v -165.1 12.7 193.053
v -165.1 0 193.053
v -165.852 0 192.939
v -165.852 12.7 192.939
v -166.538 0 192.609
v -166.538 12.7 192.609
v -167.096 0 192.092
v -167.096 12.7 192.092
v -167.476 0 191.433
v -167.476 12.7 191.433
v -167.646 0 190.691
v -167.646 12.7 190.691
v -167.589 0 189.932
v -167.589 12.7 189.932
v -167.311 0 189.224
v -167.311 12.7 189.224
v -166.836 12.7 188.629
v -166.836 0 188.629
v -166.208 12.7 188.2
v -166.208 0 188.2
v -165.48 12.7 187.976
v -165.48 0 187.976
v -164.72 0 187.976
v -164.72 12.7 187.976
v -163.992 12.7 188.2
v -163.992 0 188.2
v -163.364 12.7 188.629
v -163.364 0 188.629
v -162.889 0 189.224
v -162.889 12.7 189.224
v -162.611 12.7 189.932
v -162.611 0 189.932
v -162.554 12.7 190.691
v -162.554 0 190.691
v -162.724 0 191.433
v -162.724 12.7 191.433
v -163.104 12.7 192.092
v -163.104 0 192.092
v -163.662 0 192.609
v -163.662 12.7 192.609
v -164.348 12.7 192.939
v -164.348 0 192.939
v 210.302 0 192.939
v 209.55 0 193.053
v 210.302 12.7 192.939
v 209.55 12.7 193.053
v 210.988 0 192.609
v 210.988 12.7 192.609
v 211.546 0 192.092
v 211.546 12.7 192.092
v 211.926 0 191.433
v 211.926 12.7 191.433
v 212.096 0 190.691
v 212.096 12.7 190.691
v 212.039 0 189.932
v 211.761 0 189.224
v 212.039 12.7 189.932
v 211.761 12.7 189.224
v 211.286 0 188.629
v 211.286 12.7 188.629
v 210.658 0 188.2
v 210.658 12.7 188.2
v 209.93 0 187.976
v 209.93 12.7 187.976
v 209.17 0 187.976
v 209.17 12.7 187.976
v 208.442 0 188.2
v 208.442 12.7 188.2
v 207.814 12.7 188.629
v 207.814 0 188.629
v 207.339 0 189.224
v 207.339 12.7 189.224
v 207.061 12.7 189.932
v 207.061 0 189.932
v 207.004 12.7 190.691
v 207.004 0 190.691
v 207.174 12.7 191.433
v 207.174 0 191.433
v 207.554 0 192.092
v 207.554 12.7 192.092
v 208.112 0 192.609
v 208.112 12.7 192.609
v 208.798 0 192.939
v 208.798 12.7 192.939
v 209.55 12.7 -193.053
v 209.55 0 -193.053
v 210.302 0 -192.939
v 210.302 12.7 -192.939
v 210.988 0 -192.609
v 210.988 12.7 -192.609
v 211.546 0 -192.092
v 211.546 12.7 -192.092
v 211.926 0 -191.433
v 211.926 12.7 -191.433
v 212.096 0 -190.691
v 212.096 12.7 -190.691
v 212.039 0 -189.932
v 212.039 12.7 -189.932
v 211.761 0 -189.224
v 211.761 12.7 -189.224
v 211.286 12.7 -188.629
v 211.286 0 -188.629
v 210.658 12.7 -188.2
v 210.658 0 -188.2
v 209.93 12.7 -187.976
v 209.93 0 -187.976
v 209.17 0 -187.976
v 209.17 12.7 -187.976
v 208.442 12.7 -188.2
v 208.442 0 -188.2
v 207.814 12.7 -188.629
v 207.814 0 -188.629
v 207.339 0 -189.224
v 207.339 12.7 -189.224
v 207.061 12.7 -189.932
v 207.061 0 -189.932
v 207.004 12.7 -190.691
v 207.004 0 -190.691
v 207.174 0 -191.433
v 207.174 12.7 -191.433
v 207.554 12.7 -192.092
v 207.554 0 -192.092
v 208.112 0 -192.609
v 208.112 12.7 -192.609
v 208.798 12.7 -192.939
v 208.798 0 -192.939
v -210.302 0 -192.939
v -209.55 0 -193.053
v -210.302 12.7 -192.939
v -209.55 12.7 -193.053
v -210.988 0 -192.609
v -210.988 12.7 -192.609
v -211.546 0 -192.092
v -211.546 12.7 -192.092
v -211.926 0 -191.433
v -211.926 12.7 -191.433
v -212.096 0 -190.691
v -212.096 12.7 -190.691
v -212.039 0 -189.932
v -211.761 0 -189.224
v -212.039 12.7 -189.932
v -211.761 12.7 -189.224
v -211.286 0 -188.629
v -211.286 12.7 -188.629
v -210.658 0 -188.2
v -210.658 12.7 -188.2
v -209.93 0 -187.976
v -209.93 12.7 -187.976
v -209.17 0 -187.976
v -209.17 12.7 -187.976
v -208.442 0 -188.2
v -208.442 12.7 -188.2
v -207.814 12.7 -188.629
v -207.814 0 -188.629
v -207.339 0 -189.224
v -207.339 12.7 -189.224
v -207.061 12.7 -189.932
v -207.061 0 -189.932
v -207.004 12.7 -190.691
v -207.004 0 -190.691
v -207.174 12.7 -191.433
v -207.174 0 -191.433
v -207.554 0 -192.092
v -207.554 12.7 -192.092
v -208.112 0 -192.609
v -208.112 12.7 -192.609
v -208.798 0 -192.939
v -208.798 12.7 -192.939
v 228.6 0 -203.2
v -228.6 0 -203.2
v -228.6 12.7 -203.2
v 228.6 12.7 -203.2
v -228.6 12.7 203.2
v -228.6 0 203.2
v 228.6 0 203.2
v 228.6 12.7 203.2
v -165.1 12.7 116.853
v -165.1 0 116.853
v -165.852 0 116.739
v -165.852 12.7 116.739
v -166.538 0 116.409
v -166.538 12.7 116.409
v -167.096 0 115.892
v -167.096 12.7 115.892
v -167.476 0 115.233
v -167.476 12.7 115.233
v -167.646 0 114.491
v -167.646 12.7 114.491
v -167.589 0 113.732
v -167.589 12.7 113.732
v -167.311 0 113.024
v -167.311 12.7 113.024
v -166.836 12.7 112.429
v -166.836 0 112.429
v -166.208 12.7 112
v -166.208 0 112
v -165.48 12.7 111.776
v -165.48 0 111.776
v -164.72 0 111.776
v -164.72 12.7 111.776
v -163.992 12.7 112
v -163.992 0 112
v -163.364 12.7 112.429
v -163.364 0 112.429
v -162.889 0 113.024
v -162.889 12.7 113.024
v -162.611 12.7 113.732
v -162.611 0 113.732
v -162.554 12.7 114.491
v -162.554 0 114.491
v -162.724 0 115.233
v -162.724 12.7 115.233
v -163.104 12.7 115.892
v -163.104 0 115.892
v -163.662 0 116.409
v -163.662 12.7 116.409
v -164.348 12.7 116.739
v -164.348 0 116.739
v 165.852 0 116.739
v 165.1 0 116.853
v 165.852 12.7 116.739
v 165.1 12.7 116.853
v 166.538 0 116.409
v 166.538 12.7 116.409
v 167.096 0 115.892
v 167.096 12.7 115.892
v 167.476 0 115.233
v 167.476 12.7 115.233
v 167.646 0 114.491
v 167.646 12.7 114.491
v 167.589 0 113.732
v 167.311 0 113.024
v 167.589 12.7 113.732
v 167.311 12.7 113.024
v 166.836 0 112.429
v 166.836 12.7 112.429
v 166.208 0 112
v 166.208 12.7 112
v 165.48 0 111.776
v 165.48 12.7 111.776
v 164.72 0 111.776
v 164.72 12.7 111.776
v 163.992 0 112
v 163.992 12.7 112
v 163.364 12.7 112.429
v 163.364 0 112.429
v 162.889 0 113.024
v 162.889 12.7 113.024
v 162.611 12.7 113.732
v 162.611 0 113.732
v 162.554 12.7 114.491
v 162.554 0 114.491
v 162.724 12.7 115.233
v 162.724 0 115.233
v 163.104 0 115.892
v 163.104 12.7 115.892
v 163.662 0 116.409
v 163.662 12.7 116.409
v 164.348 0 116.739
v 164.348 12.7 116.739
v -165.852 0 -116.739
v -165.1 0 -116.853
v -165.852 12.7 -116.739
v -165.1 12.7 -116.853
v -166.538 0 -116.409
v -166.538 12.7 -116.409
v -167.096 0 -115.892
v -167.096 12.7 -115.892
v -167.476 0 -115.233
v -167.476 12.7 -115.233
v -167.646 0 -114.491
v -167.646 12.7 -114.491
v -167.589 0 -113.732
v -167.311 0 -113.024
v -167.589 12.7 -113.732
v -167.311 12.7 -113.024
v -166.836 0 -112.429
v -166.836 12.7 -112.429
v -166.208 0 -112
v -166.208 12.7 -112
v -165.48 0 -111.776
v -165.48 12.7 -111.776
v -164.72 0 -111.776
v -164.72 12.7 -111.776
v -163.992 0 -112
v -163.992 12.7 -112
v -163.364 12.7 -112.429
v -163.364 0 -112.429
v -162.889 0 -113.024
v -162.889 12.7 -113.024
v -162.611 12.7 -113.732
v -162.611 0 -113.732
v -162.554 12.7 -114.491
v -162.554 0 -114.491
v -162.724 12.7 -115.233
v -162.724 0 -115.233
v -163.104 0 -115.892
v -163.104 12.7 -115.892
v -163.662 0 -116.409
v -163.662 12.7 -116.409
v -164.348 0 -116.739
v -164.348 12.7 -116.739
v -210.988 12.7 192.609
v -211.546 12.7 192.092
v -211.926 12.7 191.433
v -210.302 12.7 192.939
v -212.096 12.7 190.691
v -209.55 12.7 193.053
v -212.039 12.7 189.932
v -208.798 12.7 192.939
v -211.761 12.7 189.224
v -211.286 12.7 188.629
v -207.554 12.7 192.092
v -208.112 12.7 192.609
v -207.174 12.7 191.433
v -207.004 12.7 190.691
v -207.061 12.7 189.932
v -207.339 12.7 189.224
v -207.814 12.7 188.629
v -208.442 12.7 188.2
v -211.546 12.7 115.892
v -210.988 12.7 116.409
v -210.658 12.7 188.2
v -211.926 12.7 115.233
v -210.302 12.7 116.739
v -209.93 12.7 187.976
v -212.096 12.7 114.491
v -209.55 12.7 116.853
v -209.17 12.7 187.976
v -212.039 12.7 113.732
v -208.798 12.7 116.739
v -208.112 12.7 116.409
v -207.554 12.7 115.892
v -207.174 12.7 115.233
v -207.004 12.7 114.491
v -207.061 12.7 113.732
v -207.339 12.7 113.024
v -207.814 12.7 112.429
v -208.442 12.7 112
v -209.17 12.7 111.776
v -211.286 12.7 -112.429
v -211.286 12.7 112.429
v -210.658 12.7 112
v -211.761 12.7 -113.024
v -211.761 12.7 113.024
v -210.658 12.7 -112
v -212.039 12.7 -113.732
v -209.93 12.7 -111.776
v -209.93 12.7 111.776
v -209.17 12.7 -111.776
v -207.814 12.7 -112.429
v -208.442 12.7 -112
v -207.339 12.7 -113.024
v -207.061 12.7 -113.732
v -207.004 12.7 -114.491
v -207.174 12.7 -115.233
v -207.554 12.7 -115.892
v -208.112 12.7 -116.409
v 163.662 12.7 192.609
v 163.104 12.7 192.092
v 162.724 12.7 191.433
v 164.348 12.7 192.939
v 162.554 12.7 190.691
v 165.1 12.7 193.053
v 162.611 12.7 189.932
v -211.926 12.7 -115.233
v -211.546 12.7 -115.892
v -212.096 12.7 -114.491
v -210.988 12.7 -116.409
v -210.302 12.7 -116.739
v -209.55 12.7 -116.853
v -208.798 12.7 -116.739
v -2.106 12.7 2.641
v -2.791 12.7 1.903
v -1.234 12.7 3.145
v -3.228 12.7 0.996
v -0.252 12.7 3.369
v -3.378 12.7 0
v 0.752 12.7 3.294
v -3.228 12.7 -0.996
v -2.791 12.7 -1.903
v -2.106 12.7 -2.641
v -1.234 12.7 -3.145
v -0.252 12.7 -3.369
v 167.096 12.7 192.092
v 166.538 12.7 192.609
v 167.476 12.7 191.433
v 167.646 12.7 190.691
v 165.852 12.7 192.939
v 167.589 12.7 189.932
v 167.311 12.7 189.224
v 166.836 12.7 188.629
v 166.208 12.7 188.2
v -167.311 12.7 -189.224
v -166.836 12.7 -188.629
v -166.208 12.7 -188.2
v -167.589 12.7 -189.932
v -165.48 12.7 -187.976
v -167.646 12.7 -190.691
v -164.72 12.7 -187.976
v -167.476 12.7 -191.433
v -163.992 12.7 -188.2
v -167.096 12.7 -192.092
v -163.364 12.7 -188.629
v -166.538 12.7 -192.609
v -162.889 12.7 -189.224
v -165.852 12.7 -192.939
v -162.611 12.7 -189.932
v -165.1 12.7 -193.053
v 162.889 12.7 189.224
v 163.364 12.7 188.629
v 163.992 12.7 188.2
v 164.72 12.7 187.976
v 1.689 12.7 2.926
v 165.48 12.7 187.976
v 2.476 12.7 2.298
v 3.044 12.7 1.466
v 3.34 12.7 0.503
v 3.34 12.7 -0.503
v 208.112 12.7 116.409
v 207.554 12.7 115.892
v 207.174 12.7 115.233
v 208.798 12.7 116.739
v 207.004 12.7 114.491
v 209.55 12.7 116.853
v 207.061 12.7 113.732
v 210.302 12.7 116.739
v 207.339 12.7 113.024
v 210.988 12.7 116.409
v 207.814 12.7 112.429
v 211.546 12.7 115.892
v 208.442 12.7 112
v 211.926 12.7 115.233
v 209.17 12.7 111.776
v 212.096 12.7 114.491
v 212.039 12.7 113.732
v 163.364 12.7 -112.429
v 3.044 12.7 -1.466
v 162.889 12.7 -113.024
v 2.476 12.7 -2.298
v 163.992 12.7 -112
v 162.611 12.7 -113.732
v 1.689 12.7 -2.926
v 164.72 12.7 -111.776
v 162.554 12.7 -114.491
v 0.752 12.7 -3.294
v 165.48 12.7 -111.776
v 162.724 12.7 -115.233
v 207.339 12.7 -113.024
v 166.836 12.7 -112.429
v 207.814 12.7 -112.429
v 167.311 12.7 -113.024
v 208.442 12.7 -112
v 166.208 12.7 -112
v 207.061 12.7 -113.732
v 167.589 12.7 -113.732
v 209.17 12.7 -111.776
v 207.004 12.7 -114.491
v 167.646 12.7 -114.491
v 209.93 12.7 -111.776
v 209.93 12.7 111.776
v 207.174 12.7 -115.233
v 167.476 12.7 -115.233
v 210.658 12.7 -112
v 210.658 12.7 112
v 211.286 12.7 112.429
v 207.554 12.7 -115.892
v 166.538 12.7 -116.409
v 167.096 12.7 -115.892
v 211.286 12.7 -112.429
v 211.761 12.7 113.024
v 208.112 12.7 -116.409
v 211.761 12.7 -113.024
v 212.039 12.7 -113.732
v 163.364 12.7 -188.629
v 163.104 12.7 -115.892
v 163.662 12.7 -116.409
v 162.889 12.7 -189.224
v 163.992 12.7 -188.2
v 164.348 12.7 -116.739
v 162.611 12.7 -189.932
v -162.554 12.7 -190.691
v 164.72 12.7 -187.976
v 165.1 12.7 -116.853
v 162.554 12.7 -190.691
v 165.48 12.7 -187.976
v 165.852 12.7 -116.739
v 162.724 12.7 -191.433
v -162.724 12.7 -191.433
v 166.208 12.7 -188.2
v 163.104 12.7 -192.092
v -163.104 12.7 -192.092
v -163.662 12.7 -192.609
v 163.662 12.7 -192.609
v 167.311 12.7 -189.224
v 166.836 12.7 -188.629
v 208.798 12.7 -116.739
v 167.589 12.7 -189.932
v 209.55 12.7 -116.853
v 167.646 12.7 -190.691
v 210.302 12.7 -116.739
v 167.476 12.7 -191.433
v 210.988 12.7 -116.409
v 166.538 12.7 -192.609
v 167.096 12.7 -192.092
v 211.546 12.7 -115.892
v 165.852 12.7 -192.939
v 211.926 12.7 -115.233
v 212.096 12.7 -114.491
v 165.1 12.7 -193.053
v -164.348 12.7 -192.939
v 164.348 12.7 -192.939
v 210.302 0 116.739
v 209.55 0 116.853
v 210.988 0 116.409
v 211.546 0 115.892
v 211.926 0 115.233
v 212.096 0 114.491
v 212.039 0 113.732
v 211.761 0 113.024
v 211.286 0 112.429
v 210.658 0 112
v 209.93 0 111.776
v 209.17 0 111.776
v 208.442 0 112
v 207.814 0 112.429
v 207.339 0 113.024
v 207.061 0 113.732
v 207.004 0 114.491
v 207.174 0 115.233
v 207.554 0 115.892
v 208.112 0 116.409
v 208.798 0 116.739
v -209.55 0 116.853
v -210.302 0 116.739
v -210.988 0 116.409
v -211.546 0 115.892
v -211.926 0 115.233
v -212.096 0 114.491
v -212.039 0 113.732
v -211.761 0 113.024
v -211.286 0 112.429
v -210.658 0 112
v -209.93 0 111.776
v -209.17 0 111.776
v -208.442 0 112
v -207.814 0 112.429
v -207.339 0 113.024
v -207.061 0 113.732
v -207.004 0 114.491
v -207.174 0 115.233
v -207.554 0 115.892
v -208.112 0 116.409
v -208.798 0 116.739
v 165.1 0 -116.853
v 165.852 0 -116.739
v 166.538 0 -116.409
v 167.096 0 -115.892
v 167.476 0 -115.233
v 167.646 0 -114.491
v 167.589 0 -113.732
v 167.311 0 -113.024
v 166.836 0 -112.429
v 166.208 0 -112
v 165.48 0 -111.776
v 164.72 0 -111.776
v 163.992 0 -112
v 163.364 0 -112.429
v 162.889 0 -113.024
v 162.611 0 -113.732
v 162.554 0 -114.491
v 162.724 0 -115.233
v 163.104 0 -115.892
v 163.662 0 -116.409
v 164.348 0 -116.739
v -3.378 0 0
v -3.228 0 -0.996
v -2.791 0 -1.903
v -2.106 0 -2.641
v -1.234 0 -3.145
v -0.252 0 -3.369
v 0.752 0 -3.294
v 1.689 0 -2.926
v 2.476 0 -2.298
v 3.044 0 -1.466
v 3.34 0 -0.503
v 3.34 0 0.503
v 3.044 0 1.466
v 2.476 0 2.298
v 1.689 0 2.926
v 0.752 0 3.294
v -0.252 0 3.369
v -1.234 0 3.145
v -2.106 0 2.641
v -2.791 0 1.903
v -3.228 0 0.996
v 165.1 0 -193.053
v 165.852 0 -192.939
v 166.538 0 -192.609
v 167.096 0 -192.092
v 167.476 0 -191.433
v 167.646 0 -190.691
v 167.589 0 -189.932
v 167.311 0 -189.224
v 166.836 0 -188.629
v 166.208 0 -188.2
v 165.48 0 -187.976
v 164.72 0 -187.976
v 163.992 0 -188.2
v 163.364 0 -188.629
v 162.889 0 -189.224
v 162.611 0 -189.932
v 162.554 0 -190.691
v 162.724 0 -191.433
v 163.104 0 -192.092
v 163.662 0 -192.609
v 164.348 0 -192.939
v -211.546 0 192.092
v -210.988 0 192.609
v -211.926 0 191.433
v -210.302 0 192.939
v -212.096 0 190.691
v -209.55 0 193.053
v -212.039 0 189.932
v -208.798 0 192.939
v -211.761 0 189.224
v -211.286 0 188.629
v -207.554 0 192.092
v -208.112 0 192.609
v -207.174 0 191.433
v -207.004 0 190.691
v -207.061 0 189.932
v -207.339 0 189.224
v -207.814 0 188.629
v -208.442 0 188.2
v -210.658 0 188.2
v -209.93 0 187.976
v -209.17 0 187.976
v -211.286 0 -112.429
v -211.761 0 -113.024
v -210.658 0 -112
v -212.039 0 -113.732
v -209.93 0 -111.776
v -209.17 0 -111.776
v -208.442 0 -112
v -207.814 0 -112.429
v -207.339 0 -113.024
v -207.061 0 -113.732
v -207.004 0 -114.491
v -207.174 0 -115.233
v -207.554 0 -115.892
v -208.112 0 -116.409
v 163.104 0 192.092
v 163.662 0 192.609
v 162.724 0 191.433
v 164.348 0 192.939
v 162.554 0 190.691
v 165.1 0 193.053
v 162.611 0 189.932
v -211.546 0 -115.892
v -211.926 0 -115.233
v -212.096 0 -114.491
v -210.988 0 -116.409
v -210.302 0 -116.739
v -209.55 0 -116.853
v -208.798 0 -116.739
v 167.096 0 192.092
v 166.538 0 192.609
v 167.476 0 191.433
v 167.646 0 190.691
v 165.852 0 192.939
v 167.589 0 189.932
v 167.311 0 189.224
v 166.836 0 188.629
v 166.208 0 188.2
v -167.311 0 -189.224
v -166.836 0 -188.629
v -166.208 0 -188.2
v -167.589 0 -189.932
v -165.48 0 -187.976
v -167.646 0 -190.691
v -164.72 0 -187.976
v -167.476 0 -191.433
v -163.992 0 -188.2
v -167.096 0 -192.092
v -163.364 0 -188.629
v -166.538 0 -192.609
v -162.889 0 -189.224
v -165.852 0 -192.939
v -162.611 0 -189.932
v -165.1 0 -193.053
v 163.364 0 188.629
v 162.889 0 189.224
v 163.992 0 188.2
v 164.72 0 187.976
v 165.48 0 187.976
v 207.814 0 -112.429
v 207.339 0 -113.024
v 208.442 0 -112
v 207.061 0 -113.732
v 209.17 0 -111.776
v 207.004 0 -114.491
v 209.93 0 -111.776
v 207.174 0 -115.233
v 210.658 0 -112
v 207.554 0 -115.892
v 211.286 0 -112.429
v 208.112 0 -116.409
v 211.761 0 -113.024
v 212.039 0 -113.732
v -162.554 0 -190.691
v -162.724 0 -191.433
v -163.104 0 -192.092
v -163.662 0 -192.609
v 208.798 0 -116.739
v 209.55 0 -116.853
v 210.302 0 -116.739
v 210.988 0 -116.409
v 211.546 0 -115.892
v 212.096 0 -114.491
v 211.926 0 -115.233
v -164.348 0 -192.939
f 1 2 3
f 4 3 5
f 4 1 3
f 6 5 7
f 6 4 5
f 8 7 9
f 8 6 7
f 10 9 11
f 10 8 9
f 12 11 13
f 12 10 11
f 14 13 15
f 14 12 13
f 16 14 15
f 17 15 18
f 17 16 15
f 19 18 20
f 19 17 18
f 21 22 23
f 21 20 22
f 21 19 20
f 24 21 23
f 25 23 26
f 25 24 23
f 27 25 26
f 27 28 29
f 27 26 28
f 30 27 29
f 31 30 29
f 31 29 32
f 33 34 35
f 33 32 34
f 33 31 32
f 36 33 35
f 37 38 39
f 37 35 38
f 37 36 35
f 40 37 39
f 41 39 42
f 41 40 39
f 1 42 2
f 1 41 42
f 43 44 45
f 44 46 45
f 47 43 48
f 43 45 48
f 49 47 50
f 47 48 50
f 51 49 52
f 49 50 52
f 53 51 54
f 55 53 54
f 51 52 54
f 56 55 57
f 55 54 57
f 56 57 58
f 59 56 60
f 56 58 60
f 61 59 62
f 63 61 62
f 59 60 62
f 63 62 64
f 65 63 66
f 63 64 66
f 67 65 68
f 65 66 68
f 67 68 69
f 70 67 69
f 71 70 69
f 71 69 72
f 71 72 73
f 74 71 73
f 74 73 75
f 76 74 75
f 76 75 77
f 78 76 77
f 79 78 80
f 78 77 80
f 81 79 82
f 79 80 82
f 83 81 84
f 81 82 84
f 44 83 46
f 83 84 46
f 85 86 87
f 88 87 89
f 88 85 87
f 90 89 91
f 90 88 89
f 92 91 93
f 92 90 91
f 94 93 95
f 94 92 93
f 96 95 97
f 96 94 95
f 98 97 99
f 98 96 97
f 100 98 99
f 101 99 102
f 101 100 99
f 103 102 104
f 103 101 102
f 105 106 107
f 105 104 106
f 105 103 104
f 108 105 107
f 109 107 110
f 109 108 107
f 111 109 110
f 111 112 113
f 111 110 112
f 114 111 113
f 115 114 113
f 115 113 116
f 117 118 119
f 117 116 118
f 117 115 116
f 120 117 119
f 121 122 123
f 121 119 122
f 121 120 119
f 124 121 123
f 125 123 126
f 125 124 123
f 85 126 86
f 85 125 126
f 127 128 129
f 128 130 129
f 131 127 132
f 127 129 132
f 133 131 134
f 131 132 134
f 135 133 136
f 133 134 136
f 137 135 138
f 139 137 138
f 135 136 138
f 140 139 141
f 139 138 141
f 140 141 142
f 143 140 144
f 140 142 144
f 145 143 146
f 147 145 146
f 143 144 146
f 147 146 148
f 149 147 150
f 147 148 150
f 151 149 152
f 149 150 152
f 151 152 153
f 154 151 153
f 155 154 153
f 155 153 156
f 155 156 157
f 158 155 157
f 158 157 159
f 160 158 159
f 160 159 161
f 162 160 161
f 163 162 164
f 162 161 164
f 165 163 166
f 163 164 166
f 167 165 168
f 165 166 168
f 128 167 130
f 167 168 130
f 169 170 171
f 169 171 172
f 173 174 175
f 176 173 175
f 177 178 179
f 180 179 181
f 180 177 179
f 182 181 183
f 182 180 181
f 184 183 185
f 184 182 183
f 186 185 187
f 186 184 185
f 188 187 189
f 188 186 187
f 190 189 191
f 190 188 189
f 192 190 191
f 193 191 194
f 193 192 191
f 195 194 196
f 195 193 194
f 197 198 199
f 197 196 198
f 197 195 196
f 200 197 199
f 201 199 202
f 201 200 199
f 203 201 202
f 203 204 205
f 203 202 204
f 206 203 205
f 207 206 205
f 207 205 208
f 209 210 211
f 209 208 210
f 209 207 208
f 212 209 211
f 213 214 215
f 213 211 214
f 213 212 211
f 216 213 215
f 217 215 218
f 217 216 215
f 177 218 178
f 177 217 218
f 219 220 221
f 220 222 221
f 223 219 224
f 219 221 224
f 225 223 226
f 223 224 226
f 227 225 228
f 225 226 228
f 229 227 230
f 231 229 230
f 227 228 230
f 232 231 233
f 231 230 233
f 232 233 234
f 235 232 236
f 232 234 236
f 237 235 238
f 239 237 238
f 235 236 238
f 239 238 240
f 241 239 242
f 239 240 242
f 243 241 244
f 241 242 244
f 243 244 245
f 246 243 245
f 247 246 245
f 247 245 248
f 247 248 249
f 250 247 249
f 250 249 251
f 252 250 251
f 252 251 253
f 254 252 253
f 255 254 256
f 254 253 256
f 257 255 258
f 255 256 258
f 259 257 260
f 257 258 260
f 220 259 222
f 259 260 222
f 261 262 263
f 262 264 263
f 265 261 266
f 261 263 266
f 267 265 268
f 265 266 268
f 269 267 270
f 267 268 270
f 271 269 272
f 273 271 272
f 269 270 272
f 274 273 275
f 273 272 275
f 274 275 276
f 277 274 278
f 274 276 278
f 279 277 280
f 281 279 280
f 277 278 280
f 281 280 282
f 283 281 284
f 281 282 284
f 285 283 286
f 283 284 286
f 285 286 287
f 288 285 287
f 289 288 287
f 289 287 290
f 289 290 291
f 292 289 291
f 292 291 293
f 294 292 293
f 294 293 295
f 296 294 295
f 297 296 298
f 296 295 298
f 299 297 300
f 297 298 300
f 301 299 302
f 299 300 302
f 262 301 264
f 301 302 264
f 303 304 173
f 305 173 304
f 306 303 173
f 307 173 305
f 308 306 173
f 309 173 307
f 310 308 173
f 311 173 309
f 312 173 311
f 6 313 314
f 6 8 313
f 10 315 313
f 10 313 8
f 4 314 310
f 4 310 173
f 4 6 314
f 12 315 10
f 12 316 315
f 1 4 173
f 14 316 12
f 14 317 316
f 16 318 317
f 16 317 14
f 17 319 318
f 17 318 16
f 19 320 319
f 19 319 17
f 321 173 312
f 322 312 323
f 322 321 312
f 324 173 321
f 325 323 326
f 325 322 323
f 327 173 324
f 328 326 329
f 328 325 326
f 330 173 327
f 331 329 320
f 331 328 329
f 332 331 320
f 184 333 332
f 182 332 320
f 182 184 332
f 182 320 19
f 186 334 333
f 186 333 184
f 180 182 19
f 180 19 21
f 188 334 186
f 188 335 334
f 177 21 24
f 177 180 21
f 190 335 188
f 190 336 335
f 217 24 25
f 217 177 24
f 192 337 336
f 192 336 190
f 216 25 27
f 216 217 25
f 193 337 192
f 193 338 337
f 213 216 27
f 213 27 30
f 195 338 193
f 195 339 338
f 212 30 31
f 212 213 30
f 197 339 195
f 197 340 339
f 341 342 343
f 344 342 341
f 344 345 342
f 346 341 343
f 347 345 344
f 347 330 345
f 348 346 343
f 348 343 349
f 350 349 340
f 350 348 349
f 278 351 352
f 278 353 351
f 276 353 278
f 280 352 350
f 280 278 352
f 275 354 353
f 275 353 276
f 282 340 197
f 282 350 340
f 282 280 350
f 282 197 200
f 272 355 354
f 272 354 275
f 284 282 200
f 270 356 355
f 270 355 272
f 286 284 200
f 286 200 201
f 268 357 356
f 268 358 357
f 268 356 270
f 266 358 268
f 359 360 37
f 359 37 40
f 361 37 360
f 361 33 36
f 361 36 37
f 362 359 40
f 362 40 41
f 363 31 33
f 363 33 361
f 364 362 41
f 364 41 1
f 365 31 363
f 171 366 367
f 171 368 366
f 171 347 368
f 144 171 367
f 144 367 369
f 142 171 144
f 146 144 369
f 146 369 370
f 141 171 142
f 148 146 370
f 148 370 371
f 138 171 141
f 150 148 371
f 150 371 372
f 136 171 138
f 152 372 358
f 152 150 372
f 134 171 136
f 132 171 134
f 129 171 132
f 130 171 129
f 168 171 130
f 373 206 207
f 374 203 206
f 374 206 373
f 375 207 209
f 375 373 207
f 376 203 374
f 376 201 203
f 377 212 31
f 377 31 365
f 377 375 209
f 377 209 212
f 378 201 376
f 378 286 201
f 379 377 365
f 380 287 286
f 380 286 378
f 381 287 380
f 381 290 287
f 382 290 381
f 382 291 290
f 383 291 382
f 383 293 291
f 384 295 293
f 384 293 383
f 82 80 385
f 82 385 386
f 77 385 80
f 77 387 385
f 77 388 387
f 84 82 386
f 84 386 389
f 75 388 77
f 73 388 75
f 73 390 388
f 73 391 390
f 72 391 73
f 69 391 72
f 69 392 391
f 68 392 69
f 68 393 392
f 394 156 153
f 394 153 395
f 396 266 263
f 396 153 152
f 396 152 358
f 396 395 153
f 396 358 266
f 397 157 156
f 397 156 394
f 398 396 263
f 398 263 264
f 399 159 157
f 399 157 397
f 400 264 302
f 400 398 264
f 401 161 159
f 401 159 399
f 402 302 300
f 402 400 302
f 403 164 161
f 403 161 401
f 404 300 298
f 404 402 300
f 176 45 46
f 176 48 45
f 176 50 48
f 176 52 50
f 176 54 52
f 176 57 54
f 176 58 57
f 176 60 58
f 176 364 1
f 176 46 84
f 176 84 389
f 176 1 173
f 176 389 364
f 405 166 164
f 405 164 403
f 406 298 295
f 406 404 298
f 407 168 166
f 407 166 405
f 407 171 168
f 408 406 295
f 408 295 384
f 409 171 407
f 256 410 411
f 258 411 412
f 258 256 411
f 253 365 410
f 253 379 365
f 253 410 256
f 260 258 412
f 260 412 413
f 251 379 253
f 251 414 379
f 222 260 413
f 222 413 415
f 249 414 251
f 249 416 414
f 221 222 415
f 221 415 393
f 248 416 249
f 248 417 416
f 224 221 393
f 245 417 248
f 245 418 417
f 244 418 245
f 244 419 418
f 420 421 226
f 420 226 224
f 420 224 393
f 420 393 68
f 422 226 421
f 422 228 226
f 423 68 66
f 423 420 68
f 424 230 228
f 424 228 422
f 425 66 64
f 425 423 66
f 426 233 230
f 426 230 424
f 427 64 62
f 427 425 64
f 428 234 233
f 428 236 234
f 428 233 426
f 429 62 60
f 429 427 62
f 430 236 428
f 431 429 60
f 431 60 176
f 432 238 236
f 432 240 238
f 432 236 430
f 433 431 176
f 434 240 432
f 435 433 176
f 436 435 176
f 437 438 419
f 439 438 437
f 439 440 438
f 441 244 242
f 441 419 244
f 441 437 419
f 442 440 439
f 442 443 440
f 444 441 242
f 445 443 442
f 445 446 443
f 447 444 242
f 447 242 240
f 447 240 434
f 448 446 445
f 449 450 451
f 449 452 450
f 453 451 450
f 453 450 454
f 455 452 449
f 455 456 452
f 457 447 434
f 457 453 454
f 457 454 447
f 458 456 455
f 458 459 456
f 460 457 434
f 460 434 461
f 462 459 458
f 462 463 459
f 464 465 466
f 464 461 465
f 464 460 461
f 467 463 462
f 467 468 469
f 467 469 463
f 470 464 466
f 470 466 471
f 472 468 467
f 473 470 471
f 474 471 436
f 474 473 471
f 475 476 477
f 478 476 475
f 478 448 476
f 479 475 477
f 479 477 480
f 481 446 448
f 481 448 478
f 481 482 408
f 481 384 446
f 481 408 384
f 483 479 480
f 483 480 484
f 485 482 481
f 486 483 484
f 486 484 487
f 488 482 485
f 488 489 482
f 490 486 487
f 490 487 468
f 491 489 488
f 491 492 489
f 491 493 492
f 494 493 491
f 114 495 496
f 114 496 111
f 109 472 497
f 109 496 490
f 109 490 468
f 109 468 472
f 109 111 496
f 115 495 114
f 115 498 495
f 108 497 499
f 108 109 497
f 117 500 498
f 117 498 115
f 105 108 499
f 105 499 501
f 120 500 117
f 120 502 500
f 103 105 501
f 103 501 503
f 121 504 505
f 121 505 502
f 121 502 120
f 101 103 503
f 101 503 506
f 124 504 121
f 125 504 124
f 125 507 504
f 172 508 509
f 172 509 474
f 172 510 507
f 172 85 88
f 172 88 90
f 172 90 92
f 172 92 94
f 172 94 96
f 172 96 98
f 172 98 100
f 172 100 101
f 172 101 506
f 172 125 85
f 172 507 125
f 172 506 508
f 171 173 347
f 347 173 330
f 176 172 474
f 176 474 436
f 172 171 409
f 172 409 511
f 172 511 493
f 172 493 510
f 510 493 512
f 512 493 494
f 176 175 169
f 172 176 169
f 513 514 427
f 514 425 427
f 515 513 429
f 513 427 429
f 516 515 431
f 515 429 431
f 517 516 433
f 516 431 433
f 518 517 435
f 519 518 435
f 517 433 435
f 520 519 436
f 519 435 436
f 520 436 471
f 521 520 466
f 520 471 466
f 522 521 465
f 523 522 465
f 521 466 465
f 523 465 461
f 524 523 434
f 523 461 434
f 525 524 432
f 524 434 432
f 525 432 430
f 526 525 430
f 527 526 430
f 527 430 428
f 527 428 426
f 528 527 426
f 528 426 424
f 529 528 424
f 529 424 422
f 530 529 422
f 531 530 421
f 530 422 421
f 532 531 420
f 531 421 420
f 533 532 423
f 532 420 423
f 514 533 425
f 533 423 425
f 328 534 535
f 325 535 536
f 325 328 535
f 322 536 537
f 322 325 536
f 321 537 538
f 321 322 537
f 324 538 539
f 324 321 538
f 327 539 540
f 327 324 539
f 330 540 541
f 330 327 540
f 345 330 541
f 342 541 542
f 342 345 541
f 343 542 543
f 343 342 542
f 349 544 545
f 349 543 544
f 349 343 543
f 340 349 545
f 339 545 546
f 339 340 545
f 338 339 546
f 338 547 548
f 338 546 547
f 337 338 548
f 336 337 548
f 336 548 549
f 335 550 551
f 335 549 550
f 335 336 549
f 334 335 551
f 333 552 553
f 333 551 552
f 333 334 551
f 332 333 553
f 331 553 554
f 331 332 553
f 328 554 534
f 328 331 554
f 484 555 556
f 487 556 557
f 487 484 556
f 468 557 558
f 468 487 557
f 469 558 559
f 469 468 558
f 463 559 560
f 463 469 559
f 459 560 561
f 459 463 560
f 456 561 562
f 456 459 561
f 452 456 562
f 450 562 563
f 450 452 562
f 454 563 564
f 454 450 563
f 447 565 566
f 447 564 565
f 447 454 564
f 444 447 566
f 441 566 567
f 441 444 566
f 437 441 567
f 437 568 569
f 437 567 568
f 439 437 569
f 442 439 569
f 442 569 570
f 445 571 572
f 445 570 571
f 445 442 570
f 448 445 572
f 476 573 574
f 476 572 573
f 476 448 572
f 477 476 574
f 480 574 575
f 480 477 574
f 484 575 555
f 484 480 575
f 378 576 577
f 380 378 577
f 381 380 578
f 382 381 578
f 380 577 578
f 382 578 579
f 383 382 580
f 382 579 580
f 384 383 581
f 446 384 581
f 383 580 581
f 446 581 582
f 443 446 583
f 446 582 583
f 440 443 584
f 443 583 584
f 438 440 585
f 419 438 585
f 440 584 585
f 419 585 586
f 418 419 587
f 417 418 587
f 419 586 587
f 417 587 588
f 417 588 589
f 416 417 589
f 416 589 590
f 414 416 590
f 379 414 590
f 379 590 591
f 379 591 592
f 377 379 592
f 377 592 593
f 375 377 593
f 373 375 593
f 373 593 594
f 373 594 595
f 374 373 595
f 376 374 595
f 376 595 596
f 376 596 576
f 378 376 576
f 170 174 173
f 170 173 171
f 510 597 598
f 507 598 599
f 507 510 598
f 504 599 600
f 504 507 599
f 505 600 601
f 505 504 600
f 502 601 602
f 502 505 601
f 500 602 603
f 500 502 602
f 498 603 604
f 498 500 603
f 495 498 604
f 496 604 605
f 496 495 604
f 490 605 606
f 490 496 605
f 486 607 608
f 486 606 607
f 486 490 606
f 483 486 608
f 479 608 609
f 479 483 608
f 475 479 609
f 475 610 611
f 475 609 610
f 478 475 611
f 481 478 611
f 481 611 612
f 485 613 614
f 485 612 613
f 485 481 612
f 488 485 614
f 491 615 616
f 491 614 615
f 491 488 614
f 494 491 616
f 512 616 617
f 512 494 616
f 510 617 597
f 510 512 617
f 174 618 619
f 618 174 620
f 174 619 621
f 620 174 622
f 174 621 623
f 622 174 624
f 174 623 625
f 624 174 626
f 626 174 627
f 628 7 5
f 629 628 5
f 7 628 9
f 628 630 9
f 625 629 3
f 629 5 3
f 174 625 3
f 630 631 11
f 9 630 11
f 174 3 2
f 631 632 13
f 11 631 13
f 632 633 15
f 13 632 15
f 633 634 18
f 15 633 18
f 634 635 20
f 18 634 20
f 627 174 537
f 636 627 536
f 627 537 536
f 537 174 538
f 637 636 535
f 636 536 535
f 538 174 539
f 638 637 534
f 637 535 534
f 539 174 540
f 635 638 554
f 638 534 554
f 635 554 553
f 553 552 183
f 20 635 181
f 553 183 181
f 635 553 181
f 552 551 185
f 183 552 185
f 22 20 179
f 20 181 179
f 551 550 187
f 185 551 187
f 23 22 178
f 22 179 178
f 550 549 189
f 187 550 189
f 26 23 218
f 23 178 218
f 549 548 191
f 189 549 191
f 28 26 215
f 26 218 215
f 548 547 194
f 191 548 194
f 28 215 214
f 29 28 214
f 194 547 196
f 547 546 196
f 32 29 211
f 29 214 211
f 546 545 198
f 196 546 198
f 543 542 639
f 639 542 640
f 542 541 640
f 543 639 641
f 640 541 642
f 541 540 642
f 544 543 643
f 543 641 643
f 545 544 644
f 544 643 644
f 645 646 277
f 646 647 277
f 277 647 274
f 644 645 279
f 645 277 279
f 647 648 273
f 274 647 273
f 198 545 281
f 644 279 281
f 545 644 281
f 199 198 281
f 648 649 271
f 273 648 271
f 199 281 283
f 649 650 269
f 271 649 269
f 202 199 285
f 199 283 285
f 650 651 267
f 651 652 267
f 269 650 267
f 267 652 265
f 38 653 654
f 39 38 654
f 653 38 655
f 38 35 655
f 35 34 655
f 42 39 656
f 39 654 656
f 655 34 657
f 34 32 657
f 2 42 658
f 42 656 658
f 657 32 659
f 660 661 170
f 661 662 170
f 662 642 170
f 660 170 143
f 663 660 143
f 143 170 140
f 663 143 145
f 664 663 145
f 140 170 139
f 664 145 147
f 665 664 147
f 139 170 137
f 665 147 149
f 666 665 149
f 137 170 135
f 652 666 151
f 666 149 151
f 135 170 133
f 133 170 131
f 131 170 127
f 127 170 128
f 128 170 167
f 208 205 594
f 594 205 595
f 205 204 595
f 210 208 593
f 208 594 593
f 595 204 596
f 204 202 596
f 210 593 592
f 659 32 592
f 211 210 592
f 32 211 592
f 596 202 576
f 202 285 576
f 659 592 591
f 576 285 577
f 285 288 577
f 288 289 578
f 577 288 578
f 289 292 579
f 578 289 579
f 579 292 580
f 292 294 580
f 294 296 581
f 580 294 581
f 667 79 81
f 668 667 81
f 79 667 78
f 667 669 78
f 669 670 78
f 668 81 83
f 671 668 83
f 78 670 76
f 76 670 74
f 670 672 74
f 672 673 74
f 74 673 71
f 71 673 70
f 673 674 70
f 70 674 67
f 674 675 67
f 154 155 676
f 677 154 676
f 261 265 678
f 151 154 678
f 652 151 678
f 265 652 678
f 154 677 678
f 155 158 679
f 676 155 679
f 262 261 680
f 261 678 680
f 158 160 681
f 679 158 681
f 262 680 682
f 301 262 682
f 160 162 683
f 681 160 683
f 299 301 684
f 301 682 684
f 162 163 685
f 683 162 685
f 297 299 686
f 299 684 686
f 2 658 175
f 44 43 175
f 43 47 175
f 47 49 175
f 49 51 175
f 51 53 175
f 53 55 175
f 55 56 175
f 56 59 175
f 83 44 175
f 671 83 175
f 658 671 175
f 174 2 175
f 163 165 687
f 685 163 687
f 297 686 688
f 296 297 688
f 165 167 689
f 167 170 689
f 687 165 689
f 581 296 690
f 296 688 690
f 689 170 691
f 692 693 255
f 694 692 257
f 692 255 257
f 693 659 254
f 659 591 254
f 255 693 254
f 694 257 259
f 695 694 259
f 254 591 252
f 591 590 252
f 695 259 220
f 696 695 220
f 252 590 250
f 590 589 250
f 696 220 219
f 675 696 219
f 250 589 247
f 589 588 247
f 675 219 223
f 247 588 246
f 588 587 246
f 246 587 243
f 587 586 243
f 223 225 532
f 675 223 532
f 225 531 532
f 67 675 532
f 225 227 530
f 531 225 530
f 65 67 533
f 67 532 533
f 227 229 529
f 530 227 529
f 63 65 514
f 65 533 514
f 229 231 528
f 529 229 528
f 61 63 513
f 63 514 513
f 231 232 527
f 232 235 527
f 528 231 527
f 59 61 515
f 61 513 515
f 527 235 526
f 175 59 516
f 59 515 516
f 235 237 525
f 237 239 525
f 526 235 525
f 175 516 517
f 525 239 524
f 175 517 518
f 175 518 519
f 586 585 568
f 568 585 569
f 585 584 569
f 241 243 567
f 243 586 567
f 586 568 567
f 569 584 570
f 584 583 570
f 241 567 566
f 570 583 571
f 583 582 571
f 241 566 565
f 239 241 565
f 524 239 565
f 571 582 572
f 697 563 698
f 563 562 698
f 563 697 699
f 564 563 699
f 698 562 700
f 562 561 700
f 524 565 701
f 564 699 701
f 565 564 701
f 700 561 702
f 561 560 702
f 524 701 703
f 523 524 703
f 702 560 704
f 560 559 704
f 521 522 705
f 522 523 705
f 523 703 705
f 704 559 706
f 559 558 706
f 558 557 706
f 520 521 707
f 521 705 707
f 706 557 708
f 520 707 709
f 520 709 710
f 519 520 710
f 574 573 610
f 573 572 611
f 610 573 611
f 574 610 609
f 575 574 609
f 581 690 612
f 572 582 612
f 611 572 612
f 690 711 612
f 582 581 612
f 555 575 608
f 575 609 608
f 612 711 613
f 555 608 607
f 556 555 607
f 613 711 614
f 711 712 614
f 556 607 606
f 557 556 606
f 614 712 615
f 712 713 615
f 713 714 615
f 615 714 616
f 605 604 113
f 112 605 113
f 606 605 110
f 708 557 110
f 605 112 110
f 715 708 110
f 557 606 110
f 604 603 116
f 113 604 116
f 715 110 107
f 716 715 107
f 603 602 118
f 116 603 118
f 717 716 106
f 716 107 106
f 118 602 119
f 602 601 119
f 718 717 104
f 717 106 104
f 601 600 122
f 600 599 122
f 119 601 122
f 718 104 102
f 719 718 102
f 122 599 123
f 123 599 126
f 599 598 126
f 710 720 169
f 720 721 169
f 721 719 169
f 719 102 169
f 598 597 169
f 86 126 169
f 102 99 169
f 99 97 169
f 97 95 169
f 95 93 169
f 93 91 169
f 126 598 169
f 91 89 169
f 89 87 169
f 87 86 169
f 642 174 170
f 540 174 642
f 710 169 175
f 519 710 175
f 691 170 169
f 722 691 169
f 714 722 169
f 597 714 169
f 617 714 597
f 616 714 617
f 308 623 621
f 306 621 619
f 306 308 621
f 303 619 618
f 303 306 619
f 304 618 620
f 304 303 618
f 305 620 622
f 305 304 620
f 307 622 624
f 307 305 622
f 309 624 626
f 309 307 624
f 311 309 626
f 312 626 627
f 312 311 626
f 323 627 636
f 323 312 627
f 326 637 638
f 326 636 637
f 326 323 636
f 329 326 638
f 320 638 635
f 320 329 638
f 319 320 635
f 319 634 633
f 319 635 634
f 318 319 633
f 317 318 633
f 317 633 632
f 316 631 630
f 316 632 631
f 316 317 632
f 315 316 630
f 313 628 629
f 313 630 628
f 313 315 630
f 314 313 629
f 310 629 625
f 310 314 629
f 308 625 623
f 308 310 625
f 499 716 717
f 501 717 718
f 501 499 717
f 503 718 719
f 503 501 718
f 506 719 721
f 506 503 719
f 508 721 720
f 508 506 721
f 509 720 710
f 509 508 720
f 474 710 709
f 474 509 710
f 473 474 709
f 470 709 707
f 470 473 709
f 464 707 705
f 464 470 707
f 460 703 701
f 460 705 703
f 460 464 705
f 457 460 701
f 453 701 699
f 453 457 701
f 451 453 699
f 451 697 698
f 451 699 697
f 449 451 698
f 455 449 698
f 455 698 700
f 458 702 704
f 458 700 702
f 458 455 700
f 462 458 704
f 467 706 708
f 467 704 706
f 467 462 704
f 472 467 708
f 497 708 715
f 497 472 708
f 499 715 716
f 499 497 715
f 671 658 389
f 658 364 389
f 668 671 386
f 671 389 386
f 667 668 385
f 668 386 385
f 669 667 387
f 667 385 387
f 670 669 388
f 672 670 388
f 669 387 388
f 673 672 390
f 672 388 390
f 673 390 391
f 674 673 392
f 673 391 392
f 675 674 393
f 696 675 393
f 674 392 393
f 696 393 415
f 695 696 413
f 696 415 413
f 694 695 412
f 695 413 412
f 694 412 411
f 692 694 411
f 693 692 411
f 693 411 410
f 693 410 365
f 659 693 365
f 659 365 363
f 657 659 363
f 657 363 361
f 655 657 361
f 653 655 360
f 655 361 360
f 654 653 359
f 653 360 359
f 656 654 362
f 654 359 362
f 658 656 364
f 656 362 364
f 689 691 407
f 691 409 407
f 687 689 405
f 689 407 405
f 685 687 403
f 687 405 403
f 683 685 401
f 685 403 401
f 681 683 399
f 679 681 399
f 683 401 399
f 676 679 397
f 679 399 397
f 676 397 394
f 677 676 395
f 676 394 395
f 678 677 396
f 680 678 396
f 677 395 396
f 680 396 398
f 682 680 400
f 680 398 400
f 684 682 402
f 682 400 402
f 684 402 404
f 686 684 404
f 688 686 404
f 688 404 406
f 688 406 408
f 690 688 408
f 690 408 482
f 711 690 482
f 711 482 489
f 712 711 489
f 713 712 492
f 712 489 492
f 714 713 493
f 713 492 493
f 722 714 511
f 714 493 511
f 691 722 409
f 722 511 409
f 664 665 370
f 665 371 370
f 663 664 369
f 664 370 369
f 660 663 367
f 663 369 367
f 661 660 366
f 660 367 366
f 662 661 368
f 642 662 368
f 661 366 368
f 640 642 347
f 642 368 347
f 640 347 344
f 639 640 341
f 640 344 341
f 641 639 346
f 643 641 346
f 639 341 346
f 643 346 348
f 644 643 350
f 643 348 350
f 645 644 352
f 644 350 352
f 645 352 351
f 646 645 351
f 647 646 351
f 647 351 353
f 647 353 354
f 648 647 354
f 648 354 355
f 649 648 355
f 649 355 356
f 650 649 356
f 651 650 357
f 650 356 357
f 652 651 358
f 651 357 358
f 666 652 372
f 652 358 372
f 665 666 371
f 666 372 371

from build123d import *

# Parameters (mm, degrees)
SKETCH1_W                        = 457.2
SKETCH1_H                        = 406.4
BOSS_EXTRUDE1_DEPTH              = 12.7
F_1_4_20_TAPPED_HOLE1_AT_2_COUNT = 2
F_1_4_20_TAPPED_HOLE1_AT_2_PITCH = 76.2
F_1_4_20_TAPPED_HOLE1_AT_3_COUNT = 2
F_1_4_20_TAPPED_HOLE1_AT_3_PITCH = 88.217019333
F_1_4_20_TAPPED_HOLE1_AT_4_COUNT = 2
F_1_4_20_TAPPED_HOLE1_AT_4_PITCH = 44.45
F_1_4_CLEARANCE_HOLE1_D          = 6.7564


with BuildPart() as part:
    # Sketch1 → Boss-Extrude1 (new body)
    with BuildSketch(Plane(origin=(0, 0, 0), x_dir=(1, 0, 0), z_dir=(0, 1, 0))):
        Rectangle(SKETCH1_W, SKETCH1_H)
    extrude(amount=BOSS_EXTRUDE1_DEPTH)

    # Sketch4 → 1/4-20 Tapped Hole1 (revolve, cut)
    with BuildSketch(Plane(origin=(-209.55, 12.7, 190.5), x_dir=(0, 0, 1), z_dir=(1, 0, 0))):
        Polygon((0, 0), (0, 18.043816902), (2.5527, 16.51), (2.5527, 0), align=None)
    f_1_4_20_tapped_hole1 = revolve(axis=Axis((-209.55, 19.05, 190.5), (0, -1, 0)), mode=Mode.SUBTRACT)

    # 1/4-20 Tapped Hole1 at 2: 1/4-20 Tapped Hole1 ×2
    with Locations(*[(0, 0, -i * F_1_4_20_TAPPED_HOLE1_AT_2_PITCH) for i in range(1, F_1_4_20_TAPPED_HOLE1_AT_2_COUNT)]):
        add(f_1_4_20_tapped_hole1, mode=Mode.SUBTRACT)

    # 1/4-20 Tapped Hole1 at 3: 1/4-20 Tapped Hole1 ×2
    with Locations(*[Vector(0.5038710255240861, 0, -0.8637789008984336) * (i * F_1_4_20_TAPPED_HOLE1_AT_3_PITCH) for i in range(1, F_1_4_20_TAPPED_HOLE1_AT_3_COUNT)]):
        add(f_1_4_20_tapped_hole1, mode=Mode.SUBTRACT)

    # 1/4-20 Tapped Hole1 at 4: 1/4-20 Tapped Hole1 ×2
    with Locations(*[(i * F_1_4_20_TAPPED_HOLE1_AT_4_PITCH, 0, 0) for i in range(1, F_1_4_20_TAPPED_HOLE1_AT_4_COUNT)]):
        add(f_1_4_20_tapped_hole1, mode=Mode.SUBTRACT)

    # Mirror1: 1/4-20 Tapped Hole1 across plane
    add(f_1_4_20_tapped_hole1.mirror(Plane(origin=(0, 0, 0), x_dir=(0, 0, 1), z_dir=(1, 0, 0))), mode=Mode.SUBTRACT)

    # Mirror1 copy 1 sketch → Mirror1 copy 1 (revolve, cut)
    with BuildSketch(Plane(origin=(209.55, 12.7, 114.3), x_dir=(0, 0, 1), z_dir=(-1, 0, 0))):
        Polygon((0, 0), (0, -18.043816902), (2.5527, -16.51), (2.5527, 0), align=None)
    revolve(axis=Axis((209.55, 19.05, 114.3), (0, 1, 0)), mode=Mode.SUBTRACT)

    # Mirror1 copy 2 sketch → Mirror1 copy 2 (revolve, cut)
    with BuildSketch(Plane(origin=(165.1, 12.7, 114.3), x_dir=(0, 0, 1), z_dir=(-1, 0, 0))):
        Polygon((0, 0), (0, -18.043816902), (2.5527, -16.51), (2.5527, 0), align=None)
    revolve(axis=Axis((165.1, 19.05, 114.3), (0, 1, 0)), mode=Mode.SUBTRACT)

    # Mirror1 copy 3 sketch → Mirror1 copy 3 (revolve, cut)
    with BuildSketch(Plane(origin=(165.1, 12.7, 190.5), x_dir=(0, 0, 1), z_dir=(-1, 0, 0))):
        Polygon((0, 0), (0, -18.043816902), (2.5527, -16.51), (2.5527, 0), align=None)
    revolve(axis=Axis((165.1, 19.05, 190.5), (0, 1, 0)), mode=Mode.SUBTRACT)

    # Mirror2: 1/4-20 Tapped Hole1 across plane
    add(f_1_4_20_tapped_hole1.mirror(Plane.XY), mode=Mode.SUBTRACT)

    # Mirror2 copy 1 sketch → Mirror2 copy 1 (revolve, cut)
    with BuildSketch(Plane(origin=(-209.55, 12.7, -114.3), x_dir=(0, 0, -1), z_dir=(1, 0, 0))):
        Polygon((0, 0), (0, -18.043816902), (2.5527, -16.51), (2.5527, 0), align=None)
    revolve(axis=Axis((-209.55, 19.05, -114.3), (0, 1, 0)), mode=Mode.SUBTRACT)

    # Mirror2 copy 2 sketch → Mirror2 copy 2 (revolve, cut)
    with BuildSketch(Plane(origin=(-165.1, 12.7, -114.3), x_dir=(0, 0, -1), z_dir=(1, 0, 0))):
        Polygon((0, 0), (0, -18.043816902), (2.5527, -16.51), (2.5527, 0), align=None)
    revolve(axis=Axis((-165.1, 19.05, -114.3), (0, 1, 0)), mode=Mode.SUBTRACT)

    # Mirror2 copy 3 sketch → Mirror2 copy 3 (revolve, cut)
    with BuildSketch(Plane(origin=(-165.1, 12.7, -190.5), x_dir=(0, 0, -1), z_dir=(1, 0, 0))):
        Polygon((0, 0), (0, -18.043816902), (2.5527, -16.51), (2.5527, 0), align=None)
    revolve(axis=Axis((-165.1, 19.05, -190.5), (0, 1, 0)), mode=Mode.SUBTRACT)

    # Mirror2 copy 4 sketch → Mirror2 copy 4 (revolve, cut)
    with BuildSketch(Plane(origin=(209.55, 12.7, -190.5), x_dir=(0, 0, -1), z_dir=(-1, 0, 0))):
        Polygon((0, 0), (0, 18.043816902), (2.5527, 16.51), (2.5527, 0), align=None)
    revolve(axis=Axis((209.55, 19.05, -190.5), (0, -1, 0)), mode=Mode.SUBTRACT)

    # Mirror2 copy 5 sketch → Mirror2 copy 5 (revolve, cut)
    with BuildSketch(Plane(origin=(209.55, 12.7, -114.3), x_dir=(0, 0, -1), z_dir=(-1, 0, 0))):
        Polygon((0, 0), (0, 18.043816902), (2.5527, 16.51), (2.5527, 0), align=None)
    revolve(axis=Axis((209.55, 19.05, -114.3), (0, -1, 0)), mode=Mode.SUBTRACT)

    # Mirror2 copy 6 sketch → Mirror2 copy 6 (revolve, cut)
    with BuildSketch(Plane(origin=(165.1, 12.7, -114.3), x_dir=(0, 0, -1), z_dir=(-1, 0, 0))):
        Polygon((0, 0), (0, 18.043816902), (2.5527, 16.51), (2.5527, 0), align=None)
    revolve(axis=Axis((165.1, 19.05, -114.3), (0, -1, 0)), mode=Mode.SUBTRACT)

    # Mirror2 copy 7 sketch → Mirror2 copy 7 (revolve, cut)
    with BuildSketch(Plane(origin=(165.1, 12.7, -190.5), x_dir=(0, 0, -1), z_dir=(-1, 0, 0))):
        Polygon((0, 0), (0, 18.043816902), (2.5527, 16.51), (2.5527, 0), align=None)
    revolve(axis=Axis((165.1, 19.05, -190.5), (0, -1, 0)), mode=Mode.SUBTRACT)

    # 1/4 Clearance Hole1 (through all)
    with Locations(Plane(origin=(0, 12.7, 0), x_dir=(1, 0, 0), z_dir=(0, 1, 0))):
        with Locations((0, 0)):
            Hole(F_1_4_CLEARANCE_HOLE1_D / 2)


solid = part.part
